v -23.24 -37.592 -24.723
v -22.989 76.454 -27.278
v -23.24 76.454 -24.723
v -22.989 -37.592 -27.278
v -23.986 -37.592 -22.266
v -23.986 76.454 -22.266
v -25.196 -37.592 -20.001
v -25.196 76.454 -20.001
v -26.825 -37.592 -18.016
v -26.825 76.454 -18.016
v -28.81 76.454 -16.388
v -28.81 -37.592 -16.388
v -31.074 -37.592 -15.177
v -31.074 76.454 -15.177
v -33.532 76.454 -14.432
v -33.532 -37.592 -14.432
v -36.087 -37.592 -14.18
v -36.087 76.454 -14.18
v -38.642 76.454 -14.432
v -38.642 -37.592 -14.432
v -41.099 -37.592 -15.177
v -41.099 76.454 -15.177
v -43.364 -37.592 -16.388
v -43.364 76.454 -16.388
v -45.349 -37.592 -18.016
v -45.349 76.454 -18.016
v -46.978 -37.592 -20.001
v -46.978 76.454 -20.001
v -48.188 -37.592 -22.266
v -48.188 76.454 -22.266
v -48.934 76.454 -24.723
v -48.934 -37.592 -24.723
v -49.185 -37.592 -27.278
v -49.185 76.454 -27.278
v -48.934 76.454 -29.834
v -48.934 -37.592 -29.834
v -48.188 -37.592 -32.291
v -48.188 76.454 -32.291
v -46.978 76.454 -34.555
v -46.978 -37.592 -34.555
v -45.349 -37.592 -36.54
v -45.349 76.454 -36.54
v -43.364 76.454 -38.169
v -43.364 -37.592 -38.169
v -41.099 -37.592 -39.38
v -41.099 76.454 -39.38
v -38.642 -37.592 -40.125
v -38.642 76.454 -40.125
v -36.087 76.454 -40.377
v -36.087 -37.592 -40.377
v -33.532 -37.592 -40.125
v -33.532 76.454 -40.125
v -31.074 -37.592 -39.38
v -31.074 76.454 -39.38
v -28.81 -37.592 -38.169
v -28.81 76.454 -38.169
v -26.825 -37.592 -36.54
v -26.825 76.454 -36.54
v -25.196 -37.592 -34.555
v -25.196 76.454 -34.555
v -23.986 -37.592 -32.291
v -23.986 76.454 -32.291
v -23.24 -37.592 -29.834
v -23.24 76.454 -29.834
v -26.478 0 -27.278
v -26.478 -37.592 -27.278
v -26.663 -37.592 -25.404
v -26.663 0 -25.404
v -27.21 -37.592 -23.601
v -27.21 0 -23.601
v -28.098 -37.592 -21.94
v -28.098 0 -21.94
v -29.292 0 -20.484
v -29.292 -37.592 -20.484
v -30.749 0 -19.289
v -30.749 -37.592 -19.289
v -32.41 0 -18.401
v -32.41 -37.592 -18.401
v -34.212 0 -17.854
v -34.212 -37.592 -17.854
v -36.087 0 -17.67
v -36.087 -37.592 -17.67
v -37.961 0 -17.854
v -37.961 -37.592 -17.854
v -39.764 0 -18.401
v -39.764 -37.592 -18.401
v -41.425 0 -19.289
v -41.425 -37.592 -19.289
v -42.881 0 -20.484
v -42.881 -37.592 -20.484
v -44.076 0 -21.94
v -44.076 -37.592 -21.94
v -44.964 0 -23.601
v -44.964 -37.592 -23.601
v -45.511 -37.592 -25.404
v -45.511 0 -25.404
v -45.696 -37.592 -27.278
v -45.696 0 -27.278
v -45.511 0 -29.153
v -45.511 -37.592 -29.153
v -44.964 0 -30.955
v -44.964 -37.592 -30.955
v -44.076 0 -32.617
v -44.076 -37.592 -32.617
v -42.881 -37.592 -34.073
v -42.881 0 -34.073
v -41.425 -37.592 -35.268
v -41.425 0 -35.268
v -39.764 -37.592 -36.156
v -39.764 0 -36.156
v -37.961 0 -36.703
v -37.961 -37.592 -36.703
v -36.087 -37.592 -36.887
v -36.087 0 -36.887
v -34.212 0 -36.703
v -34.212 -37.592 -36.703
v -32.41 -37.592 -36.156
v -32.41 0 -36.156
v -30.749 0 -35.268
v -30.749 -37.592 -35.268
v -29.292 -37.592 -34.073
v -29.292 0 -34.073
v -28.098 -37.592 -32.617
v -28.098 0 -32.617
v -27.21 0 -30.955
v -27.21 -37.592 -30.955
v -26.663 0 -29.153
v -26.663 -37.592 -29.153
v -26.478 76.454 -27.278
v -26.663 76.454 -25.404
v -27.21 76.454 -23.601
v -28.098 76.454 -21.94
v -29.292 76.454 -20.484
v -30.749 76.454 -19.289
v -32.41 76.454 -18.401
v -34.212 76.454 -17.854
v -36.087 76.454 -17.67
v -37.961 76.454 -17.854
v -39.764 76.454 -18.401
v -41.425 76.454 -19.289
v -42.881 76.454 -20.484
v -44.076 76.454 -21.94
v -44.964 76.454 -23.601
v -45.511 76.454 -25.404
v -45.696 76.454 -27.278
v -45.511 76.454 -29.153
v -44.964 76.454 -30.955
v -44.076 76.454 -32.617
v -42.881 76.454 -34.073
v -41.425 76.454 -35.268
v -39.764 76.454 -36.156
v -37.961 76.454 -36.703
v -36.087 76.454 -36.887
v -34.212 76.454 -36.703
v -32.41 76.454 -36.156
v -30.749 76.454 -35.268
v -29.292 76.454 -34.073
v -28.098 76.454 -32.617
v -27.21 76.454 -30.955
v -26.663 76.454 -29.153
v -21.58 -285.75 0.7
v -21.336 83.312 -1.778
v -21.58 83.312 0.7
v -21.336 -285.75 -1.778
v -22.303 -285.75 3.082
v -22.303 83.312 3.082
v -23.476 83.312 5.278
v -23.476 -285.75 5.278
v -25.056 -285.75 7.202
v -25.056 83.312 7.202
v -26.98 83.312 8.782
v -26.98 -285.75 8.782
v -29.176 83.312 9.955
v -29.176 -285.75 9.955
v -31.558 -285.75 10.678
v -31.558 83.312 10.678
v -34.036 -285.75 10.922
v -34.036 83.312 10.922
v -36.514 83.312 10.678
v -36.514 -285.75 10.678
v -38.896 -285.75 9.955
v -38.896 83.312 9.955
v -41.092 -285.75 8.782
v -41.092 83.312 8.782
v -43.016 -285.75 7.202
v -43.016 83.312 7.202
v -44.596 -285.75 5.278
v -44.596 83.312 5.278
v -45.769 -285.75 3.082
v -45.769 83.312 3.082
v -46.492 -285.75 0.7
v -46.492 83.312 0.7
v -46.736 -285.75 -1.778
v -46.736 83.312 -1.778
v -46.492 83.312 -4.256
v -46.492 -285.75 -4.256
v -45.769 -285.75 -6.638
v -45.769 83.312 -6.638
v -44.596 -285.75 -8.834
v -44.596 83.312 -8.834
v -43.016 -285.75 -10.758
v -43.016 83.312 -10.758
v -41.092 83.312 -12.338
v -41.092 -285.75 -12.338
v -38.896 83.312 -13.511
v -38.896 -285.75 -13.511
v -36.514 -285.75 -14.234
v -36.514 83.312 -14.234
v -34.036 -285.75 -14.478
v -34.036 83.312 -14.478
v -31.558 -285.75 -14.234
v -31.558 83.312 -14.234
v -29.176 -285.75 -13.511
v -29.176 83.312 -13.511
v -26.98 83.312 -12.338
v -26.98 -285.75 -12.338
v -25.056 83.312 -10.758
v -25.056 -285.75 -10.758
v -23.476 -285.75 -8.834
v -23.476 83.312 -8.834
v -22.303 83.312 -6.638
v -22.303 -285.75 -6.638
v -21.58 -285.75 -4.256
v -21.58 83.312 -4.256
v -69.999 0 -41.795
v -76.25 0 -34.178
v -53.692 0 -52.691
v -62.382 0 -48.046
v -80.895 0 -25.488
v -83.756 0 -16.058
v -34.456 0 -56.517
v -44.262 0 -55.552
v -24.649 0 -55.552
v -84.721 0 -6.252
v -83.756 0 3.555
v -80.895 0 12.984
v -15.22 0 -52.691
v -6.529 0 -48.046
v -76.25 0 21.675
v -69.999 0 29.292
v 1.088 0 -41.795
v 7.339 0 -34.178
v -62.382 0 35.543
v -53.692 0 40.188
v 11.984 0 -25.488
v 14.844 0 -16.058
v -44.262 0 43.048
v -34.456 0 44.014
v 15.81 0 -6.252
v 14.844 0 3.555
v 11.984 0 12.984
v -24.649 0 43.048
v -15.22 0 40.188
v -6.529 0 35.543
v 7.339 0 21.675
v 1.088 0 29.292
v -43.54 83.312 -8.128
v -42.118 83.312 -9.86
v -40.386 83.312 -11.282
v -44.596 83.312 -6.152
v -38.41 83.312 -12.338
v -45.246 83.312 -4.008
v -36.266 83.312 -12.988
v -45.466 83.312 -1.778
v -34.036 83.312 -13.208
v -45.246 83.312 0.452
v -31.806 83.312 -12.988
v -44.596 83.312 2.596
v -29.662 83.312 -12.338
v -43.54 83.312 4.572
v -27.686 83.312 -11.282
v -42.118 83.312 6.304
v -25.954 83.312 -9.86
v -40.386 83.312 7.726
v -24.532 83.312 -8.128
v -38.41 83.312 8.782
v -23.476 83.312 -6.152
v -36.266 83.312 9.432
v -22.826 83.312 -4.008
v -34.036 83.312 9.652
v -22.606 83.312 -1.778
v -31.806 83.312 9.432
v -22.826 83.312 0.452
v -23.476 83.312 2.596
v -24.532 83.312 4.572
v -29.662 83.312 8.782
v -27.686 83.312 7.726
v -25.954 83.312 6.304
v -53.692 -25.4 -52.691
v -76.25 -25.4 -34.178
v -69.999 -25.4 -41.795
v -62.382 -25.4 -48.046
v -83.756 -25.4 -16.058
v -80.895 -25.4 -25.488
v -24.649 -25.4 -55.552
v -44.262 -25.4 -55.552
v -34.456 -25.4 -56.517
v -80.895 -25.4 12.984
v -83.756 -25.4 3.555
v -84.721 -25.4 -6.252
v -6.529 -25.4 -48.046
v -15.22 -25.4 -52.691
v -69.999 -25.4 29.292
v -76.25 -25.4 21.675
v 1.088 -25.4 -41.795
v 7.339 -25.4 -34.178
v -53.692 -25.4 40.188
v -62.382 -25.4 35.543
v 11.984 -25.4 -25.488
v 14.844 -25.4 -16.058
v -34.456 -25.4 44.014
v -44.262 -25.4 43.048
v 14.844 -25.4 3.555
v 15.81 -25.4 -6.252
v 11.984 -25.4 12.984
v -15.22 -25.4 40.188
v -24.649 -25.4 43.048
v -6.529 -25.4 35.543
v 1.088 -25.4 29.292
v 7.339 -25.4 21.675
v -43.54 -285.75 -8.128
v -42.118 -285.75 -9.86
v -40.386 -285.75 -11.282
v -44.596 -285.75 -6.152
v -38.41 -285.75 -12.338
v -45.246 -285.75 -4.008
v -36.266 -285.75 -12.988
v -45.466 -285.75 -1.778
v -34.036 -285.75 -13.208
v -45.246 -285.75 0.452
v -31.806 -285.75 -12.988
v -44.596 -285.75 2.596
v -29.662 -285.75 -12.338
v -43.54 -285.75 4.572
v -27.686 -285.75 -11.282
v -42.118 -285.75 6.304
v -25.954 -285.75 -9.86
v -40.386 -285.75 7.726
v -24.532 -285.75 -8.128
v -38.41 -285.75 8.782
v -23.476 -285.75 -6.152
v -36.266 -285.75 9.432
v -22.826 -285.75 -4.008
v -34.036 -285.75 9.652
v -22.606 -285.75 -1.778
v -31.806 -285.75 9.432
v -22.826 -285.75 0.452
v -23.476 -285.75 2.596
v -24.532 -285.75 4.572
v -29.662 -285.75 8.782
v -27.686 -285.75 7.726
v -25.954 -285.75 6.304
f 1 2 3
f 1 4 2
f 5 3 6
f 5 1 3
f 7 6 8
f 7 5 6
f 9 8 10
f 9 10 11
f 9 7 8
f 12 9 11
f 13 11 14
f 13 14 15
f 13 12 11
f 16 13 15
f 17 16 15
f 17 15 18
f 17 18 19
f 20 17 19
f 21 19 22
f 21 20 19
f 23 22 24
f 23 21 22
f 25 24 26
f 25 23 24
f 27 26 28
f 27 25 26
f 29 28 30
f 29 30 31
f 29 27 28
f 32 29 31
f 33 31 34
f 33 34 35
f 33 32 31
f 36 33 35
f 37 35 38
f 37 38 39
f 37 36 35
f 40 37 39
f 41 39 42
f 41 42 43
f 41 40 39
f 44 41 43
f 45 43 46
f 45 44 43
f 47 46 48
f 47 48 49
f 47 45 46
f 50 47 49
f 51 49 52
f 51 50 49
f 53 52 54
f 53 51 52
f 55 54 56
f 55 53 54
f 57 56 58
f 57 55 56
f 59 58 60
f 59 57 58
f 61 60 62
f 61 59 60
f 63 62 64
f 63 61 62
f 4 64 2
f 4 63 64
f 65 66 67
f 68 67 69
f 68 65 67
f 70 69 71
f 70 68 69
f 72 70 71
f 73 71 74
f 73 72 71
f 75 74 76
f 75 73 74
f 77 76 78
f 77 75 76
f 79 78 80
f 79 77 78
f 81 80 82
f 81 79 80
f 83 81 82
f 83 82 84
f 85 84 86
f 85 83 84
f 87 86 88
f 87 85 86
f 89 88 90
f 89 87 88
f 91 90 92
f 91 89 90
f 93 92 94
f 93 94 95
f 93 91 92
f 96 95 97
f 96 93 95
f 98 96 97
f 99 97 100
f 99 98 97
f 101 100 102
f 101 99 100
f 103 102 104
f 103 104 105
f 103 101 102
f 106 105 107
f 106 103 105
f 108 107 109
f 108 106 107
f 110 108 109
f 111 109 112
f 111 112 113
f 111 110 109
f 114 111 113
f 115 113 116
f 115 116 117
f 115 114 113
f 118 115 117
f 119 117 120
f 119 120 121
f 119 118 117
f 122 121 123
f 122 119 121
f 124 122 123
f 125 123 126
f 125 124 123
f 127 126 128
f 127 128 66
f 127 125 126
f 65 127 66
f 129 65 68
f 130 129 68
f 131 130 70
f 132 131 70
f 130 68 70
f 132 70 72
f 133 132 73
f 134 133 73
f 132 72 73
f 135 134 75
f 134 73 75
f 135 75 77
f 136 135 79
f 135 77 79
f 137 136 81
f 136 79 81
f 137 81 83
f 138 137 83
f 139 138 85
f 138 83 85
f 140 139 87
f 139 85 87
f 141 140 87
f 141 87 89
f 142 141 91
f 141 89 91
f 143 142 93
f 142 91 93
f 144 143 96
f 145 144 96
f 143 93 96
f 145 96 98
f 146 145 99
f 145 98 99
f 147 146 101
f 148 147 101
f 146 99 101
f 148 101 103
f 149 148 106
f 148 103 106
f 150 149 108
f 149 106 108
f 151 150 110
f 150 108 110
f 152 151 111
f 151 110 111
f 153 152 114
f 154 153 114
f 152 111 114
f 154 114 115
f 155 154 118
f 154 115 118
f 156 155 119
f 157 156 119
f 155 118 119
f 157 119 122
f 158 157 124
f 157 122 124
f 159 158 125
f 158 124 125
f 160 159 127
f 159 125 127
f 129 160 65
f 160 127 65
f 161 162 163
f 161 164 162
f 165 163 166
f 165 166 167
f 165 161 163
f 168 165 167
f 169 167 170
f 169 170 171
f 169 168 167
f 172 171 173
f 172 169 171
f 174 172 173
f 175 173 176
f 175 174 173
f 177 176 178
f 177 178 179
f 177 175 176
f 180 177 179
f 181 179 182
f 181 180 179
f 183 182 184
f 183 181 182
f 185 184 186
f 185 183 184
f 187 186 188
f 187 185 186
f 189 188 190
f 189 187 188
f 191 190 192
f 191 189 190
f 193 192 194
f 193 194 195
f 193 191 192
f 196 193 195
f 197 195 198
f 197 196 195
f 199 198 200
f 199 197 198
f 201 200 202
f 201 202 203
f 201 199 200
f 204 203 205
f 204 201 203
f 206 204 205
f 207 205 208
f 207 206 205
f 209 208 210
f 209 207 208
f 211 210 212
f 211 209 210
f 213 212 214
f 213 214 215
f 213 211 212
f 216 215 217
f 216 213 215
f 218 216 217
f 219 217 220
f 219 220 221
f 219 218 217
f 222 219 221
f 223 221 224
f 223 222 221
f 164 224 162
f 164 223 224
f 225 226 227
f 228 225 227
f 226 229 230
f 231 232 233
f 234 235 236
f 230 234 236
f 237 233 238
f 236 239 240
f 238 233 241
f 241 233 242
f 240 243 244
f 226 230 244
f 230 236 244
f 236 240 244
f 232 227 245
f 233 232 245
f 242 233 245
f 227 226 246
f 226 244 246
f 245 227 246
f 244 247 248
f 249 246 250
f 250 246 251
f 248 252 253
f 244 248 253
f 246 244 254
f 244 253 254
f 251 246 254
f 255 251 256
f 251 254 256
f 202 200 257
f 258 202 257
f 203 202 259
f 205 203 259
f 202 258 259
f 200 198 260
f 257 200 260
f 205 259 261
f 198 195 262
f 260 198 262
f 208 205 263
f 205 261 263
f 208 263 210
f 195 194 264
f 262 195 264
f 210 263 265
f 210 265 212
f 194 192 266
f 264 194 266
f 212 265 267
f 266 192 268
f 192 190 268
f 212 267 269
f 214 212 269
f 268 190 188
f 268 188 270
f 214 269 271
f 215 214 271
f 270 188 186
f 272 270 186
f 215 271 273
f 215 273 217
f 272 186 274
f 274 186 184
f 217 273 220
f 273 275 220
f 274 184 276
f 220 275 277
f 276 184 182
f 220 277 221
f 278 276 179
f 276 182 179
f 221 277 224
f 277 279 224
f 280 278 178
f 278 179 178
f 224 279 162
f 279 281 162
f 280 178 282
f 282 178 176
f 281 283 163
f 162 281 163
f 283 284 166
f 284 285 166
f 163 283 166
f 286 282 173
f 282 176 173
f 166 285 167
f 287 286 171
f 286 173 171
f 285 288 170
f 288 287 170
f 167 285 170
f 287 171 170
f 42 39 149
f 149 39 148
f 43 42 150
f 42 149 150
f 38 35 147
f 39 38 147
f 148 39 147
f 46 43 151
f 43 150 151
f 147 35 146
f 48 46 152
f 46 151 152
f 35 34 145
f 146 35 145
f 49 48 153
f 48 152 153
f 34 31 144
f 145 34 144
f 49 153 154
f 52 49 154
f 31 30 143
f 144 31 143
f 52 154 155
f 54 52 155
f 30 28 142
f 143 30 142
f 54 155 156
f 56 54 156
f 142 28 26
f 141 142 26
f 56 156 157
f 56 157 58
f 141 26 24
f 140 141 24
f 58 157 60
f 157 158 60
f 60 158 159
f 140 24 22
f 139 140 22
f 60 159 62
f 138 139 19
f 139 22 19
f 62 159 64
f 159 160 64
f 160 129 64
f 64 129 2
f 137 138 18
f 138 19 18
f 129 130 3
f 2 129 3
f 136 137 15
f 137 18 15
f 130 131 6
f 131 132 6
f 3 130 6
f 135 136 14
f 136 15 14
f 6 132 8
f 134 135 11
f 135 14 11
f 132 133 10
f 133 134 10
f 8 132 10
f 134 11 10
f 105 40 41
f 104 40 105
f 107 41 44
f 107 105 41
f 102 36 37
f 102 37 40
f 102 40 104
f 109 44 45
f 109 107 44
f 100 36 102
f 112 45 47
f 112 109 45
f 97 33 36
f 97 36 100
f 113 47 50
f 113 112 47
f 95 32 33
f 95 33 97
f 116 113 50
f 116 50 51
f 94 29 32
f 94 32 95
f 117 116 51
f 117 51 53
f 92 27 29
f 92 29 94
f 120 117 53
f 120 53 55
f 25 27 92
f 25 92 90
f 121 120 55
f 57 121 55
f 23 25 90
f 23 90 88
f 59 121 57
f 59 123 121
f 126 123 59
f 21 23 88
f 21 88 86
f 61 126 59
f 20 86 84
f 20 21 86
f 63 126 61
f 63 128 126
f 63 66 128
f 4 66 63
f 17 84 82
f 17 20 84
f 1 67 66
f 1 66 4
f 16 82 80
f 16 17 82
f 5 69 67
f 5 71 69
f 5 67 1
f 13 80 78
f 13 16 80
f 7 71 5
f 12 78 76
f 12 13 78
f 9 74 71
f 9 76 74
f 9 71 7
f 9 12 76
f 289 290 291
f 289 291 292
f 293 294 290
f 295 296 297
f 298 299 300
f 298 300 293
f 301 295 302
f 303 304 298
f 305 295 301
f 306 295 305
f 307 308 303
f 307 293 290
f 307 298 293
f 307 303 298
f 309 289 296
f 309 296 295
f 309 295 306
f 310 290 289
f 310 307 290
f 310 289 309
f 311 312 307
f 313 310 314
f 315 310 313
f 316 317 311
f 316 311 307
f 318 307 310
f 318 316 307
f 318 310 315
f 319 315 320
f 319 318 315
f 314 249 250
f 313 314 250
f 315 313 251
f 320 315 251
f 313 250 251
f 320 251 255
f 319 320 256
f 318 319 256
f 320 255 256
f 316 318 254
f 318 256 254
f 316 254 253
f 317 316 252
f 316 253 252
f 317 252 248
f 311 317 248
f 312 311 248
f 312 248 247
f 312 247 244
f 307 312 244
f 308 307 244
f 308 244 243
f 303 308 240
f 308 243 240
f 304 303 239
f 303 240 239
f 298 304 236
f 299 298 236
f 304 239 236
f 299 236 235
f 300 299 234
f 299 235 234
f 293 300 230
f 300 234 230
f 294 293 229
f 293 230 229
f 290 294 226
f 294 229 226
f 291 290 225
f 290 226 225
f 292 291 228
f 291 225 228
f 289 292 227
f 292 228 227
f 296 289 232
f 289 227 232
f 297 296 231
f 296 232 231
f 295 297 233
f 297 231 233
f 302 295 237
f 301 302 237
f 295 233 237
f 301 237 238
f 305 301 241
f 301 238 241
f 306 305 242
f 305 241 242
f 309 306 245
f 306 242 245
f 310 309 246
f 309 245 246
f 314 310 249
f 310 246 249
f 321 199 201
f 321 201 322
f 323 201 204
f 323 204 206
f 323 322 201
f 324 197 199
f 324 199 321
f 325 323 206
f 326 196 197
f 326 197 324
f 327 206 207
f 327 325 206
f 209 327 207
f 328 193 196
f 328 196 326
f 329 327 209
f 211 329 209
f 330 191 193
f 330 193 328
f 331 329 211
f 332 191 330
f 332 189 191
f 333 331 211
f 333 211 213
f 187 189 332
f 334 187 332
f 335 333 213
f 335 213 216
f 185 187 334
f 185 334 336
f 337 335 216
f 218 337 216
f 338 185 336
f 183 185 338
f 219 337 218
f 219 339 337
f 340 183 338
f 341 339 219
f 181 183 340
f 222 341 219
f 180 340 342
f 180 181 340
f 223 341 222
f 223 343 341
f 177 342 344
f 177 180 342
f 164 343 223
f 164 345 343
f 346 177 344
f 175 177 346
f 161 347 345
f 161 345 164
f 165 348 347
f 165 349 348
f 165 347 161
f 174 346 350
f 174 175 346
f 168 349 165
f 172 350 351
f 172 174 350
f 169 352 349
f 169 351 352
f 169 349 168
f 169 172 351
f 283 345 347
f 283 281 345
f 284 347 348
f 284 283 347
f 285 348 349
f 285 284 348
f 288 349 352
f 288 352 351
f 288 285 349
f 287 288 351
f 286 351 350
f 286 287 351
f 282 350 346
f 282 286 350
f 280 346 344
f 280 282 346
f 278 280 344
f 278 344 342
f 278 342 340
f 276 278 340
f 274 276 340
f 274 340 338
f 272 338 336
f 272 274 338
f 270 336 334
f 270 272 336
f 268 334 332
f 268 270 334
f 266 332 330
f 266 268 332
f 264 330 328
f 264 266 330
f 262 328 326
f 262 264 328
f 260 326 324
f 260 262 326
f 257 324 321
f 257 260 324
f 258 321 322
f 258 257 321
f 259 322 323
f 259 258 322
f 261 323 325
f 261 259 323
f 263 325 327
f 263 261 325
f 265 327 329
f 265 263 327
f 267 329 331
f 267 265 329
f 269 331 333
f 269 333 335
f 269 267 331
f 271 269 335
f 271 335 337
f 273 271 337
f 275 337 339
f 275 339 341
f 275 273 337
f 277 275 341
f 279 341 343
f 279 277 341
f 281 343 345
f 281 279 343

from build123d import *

# Parameters (mm, degrees)
F0_R          = 12.7
F0_R_2        = 11.43
F1_DEPTH      = 285.75
F1_DEPTH_BACK = 83.312
F2_R          = 13.098319
F2_R_2        = 9.608749
F3_DEPTH      = 37.592
F3_DEPTH_BACK = 76.454
F5_R          = 50.265857
F6_DEPTH      = 25.4


with BuildPart() as f1:
    # F0 (on Front) → F1 (new body, two sides)
    with BuildSketch(Plane.XZ) as f1_sk:
        Circle(F0_R)
        Circle(F0_R_2, mode=Mode.SUBTRACT)
    extrude(amount=F1_DEPTH)
    extrude(f1_sk.sketch, amount=-F1_DEPTH_BACK)


with BuildPart() as f3:
    # F2 (on Front) → F3 (new body, two sides)
    with BuildSketch(Plane.XZ) as f3_sk:
        with Locations((-36.086891, -27.278386)):
            Circle(F2_R)
        with Locations((-36.086891, -27.278386)):
            Circle(F2_R_2, mode=Mode.SUBTRACT)
    extrude(amount=F3_DEPTH)
    extrude(f3_sk.sketch, amount=-F3_DEPTH_BACK)


with BuildPart() as f1_1:
    # F4: moved
    add(f1.part.moved(Location((-34.036, 0, -1.778))))


with BuildPart() as f6:
    # F5 (on Front) → F6 (new body)
    with BuildSketch(Plane.XZ):
        with Locations((-34.455627, -6.251627)):
            Circle(F5_R)
    extrude(amount=F6_DEPTH)


solid = Compound([f3.part, f1_1.part, f6.part])
